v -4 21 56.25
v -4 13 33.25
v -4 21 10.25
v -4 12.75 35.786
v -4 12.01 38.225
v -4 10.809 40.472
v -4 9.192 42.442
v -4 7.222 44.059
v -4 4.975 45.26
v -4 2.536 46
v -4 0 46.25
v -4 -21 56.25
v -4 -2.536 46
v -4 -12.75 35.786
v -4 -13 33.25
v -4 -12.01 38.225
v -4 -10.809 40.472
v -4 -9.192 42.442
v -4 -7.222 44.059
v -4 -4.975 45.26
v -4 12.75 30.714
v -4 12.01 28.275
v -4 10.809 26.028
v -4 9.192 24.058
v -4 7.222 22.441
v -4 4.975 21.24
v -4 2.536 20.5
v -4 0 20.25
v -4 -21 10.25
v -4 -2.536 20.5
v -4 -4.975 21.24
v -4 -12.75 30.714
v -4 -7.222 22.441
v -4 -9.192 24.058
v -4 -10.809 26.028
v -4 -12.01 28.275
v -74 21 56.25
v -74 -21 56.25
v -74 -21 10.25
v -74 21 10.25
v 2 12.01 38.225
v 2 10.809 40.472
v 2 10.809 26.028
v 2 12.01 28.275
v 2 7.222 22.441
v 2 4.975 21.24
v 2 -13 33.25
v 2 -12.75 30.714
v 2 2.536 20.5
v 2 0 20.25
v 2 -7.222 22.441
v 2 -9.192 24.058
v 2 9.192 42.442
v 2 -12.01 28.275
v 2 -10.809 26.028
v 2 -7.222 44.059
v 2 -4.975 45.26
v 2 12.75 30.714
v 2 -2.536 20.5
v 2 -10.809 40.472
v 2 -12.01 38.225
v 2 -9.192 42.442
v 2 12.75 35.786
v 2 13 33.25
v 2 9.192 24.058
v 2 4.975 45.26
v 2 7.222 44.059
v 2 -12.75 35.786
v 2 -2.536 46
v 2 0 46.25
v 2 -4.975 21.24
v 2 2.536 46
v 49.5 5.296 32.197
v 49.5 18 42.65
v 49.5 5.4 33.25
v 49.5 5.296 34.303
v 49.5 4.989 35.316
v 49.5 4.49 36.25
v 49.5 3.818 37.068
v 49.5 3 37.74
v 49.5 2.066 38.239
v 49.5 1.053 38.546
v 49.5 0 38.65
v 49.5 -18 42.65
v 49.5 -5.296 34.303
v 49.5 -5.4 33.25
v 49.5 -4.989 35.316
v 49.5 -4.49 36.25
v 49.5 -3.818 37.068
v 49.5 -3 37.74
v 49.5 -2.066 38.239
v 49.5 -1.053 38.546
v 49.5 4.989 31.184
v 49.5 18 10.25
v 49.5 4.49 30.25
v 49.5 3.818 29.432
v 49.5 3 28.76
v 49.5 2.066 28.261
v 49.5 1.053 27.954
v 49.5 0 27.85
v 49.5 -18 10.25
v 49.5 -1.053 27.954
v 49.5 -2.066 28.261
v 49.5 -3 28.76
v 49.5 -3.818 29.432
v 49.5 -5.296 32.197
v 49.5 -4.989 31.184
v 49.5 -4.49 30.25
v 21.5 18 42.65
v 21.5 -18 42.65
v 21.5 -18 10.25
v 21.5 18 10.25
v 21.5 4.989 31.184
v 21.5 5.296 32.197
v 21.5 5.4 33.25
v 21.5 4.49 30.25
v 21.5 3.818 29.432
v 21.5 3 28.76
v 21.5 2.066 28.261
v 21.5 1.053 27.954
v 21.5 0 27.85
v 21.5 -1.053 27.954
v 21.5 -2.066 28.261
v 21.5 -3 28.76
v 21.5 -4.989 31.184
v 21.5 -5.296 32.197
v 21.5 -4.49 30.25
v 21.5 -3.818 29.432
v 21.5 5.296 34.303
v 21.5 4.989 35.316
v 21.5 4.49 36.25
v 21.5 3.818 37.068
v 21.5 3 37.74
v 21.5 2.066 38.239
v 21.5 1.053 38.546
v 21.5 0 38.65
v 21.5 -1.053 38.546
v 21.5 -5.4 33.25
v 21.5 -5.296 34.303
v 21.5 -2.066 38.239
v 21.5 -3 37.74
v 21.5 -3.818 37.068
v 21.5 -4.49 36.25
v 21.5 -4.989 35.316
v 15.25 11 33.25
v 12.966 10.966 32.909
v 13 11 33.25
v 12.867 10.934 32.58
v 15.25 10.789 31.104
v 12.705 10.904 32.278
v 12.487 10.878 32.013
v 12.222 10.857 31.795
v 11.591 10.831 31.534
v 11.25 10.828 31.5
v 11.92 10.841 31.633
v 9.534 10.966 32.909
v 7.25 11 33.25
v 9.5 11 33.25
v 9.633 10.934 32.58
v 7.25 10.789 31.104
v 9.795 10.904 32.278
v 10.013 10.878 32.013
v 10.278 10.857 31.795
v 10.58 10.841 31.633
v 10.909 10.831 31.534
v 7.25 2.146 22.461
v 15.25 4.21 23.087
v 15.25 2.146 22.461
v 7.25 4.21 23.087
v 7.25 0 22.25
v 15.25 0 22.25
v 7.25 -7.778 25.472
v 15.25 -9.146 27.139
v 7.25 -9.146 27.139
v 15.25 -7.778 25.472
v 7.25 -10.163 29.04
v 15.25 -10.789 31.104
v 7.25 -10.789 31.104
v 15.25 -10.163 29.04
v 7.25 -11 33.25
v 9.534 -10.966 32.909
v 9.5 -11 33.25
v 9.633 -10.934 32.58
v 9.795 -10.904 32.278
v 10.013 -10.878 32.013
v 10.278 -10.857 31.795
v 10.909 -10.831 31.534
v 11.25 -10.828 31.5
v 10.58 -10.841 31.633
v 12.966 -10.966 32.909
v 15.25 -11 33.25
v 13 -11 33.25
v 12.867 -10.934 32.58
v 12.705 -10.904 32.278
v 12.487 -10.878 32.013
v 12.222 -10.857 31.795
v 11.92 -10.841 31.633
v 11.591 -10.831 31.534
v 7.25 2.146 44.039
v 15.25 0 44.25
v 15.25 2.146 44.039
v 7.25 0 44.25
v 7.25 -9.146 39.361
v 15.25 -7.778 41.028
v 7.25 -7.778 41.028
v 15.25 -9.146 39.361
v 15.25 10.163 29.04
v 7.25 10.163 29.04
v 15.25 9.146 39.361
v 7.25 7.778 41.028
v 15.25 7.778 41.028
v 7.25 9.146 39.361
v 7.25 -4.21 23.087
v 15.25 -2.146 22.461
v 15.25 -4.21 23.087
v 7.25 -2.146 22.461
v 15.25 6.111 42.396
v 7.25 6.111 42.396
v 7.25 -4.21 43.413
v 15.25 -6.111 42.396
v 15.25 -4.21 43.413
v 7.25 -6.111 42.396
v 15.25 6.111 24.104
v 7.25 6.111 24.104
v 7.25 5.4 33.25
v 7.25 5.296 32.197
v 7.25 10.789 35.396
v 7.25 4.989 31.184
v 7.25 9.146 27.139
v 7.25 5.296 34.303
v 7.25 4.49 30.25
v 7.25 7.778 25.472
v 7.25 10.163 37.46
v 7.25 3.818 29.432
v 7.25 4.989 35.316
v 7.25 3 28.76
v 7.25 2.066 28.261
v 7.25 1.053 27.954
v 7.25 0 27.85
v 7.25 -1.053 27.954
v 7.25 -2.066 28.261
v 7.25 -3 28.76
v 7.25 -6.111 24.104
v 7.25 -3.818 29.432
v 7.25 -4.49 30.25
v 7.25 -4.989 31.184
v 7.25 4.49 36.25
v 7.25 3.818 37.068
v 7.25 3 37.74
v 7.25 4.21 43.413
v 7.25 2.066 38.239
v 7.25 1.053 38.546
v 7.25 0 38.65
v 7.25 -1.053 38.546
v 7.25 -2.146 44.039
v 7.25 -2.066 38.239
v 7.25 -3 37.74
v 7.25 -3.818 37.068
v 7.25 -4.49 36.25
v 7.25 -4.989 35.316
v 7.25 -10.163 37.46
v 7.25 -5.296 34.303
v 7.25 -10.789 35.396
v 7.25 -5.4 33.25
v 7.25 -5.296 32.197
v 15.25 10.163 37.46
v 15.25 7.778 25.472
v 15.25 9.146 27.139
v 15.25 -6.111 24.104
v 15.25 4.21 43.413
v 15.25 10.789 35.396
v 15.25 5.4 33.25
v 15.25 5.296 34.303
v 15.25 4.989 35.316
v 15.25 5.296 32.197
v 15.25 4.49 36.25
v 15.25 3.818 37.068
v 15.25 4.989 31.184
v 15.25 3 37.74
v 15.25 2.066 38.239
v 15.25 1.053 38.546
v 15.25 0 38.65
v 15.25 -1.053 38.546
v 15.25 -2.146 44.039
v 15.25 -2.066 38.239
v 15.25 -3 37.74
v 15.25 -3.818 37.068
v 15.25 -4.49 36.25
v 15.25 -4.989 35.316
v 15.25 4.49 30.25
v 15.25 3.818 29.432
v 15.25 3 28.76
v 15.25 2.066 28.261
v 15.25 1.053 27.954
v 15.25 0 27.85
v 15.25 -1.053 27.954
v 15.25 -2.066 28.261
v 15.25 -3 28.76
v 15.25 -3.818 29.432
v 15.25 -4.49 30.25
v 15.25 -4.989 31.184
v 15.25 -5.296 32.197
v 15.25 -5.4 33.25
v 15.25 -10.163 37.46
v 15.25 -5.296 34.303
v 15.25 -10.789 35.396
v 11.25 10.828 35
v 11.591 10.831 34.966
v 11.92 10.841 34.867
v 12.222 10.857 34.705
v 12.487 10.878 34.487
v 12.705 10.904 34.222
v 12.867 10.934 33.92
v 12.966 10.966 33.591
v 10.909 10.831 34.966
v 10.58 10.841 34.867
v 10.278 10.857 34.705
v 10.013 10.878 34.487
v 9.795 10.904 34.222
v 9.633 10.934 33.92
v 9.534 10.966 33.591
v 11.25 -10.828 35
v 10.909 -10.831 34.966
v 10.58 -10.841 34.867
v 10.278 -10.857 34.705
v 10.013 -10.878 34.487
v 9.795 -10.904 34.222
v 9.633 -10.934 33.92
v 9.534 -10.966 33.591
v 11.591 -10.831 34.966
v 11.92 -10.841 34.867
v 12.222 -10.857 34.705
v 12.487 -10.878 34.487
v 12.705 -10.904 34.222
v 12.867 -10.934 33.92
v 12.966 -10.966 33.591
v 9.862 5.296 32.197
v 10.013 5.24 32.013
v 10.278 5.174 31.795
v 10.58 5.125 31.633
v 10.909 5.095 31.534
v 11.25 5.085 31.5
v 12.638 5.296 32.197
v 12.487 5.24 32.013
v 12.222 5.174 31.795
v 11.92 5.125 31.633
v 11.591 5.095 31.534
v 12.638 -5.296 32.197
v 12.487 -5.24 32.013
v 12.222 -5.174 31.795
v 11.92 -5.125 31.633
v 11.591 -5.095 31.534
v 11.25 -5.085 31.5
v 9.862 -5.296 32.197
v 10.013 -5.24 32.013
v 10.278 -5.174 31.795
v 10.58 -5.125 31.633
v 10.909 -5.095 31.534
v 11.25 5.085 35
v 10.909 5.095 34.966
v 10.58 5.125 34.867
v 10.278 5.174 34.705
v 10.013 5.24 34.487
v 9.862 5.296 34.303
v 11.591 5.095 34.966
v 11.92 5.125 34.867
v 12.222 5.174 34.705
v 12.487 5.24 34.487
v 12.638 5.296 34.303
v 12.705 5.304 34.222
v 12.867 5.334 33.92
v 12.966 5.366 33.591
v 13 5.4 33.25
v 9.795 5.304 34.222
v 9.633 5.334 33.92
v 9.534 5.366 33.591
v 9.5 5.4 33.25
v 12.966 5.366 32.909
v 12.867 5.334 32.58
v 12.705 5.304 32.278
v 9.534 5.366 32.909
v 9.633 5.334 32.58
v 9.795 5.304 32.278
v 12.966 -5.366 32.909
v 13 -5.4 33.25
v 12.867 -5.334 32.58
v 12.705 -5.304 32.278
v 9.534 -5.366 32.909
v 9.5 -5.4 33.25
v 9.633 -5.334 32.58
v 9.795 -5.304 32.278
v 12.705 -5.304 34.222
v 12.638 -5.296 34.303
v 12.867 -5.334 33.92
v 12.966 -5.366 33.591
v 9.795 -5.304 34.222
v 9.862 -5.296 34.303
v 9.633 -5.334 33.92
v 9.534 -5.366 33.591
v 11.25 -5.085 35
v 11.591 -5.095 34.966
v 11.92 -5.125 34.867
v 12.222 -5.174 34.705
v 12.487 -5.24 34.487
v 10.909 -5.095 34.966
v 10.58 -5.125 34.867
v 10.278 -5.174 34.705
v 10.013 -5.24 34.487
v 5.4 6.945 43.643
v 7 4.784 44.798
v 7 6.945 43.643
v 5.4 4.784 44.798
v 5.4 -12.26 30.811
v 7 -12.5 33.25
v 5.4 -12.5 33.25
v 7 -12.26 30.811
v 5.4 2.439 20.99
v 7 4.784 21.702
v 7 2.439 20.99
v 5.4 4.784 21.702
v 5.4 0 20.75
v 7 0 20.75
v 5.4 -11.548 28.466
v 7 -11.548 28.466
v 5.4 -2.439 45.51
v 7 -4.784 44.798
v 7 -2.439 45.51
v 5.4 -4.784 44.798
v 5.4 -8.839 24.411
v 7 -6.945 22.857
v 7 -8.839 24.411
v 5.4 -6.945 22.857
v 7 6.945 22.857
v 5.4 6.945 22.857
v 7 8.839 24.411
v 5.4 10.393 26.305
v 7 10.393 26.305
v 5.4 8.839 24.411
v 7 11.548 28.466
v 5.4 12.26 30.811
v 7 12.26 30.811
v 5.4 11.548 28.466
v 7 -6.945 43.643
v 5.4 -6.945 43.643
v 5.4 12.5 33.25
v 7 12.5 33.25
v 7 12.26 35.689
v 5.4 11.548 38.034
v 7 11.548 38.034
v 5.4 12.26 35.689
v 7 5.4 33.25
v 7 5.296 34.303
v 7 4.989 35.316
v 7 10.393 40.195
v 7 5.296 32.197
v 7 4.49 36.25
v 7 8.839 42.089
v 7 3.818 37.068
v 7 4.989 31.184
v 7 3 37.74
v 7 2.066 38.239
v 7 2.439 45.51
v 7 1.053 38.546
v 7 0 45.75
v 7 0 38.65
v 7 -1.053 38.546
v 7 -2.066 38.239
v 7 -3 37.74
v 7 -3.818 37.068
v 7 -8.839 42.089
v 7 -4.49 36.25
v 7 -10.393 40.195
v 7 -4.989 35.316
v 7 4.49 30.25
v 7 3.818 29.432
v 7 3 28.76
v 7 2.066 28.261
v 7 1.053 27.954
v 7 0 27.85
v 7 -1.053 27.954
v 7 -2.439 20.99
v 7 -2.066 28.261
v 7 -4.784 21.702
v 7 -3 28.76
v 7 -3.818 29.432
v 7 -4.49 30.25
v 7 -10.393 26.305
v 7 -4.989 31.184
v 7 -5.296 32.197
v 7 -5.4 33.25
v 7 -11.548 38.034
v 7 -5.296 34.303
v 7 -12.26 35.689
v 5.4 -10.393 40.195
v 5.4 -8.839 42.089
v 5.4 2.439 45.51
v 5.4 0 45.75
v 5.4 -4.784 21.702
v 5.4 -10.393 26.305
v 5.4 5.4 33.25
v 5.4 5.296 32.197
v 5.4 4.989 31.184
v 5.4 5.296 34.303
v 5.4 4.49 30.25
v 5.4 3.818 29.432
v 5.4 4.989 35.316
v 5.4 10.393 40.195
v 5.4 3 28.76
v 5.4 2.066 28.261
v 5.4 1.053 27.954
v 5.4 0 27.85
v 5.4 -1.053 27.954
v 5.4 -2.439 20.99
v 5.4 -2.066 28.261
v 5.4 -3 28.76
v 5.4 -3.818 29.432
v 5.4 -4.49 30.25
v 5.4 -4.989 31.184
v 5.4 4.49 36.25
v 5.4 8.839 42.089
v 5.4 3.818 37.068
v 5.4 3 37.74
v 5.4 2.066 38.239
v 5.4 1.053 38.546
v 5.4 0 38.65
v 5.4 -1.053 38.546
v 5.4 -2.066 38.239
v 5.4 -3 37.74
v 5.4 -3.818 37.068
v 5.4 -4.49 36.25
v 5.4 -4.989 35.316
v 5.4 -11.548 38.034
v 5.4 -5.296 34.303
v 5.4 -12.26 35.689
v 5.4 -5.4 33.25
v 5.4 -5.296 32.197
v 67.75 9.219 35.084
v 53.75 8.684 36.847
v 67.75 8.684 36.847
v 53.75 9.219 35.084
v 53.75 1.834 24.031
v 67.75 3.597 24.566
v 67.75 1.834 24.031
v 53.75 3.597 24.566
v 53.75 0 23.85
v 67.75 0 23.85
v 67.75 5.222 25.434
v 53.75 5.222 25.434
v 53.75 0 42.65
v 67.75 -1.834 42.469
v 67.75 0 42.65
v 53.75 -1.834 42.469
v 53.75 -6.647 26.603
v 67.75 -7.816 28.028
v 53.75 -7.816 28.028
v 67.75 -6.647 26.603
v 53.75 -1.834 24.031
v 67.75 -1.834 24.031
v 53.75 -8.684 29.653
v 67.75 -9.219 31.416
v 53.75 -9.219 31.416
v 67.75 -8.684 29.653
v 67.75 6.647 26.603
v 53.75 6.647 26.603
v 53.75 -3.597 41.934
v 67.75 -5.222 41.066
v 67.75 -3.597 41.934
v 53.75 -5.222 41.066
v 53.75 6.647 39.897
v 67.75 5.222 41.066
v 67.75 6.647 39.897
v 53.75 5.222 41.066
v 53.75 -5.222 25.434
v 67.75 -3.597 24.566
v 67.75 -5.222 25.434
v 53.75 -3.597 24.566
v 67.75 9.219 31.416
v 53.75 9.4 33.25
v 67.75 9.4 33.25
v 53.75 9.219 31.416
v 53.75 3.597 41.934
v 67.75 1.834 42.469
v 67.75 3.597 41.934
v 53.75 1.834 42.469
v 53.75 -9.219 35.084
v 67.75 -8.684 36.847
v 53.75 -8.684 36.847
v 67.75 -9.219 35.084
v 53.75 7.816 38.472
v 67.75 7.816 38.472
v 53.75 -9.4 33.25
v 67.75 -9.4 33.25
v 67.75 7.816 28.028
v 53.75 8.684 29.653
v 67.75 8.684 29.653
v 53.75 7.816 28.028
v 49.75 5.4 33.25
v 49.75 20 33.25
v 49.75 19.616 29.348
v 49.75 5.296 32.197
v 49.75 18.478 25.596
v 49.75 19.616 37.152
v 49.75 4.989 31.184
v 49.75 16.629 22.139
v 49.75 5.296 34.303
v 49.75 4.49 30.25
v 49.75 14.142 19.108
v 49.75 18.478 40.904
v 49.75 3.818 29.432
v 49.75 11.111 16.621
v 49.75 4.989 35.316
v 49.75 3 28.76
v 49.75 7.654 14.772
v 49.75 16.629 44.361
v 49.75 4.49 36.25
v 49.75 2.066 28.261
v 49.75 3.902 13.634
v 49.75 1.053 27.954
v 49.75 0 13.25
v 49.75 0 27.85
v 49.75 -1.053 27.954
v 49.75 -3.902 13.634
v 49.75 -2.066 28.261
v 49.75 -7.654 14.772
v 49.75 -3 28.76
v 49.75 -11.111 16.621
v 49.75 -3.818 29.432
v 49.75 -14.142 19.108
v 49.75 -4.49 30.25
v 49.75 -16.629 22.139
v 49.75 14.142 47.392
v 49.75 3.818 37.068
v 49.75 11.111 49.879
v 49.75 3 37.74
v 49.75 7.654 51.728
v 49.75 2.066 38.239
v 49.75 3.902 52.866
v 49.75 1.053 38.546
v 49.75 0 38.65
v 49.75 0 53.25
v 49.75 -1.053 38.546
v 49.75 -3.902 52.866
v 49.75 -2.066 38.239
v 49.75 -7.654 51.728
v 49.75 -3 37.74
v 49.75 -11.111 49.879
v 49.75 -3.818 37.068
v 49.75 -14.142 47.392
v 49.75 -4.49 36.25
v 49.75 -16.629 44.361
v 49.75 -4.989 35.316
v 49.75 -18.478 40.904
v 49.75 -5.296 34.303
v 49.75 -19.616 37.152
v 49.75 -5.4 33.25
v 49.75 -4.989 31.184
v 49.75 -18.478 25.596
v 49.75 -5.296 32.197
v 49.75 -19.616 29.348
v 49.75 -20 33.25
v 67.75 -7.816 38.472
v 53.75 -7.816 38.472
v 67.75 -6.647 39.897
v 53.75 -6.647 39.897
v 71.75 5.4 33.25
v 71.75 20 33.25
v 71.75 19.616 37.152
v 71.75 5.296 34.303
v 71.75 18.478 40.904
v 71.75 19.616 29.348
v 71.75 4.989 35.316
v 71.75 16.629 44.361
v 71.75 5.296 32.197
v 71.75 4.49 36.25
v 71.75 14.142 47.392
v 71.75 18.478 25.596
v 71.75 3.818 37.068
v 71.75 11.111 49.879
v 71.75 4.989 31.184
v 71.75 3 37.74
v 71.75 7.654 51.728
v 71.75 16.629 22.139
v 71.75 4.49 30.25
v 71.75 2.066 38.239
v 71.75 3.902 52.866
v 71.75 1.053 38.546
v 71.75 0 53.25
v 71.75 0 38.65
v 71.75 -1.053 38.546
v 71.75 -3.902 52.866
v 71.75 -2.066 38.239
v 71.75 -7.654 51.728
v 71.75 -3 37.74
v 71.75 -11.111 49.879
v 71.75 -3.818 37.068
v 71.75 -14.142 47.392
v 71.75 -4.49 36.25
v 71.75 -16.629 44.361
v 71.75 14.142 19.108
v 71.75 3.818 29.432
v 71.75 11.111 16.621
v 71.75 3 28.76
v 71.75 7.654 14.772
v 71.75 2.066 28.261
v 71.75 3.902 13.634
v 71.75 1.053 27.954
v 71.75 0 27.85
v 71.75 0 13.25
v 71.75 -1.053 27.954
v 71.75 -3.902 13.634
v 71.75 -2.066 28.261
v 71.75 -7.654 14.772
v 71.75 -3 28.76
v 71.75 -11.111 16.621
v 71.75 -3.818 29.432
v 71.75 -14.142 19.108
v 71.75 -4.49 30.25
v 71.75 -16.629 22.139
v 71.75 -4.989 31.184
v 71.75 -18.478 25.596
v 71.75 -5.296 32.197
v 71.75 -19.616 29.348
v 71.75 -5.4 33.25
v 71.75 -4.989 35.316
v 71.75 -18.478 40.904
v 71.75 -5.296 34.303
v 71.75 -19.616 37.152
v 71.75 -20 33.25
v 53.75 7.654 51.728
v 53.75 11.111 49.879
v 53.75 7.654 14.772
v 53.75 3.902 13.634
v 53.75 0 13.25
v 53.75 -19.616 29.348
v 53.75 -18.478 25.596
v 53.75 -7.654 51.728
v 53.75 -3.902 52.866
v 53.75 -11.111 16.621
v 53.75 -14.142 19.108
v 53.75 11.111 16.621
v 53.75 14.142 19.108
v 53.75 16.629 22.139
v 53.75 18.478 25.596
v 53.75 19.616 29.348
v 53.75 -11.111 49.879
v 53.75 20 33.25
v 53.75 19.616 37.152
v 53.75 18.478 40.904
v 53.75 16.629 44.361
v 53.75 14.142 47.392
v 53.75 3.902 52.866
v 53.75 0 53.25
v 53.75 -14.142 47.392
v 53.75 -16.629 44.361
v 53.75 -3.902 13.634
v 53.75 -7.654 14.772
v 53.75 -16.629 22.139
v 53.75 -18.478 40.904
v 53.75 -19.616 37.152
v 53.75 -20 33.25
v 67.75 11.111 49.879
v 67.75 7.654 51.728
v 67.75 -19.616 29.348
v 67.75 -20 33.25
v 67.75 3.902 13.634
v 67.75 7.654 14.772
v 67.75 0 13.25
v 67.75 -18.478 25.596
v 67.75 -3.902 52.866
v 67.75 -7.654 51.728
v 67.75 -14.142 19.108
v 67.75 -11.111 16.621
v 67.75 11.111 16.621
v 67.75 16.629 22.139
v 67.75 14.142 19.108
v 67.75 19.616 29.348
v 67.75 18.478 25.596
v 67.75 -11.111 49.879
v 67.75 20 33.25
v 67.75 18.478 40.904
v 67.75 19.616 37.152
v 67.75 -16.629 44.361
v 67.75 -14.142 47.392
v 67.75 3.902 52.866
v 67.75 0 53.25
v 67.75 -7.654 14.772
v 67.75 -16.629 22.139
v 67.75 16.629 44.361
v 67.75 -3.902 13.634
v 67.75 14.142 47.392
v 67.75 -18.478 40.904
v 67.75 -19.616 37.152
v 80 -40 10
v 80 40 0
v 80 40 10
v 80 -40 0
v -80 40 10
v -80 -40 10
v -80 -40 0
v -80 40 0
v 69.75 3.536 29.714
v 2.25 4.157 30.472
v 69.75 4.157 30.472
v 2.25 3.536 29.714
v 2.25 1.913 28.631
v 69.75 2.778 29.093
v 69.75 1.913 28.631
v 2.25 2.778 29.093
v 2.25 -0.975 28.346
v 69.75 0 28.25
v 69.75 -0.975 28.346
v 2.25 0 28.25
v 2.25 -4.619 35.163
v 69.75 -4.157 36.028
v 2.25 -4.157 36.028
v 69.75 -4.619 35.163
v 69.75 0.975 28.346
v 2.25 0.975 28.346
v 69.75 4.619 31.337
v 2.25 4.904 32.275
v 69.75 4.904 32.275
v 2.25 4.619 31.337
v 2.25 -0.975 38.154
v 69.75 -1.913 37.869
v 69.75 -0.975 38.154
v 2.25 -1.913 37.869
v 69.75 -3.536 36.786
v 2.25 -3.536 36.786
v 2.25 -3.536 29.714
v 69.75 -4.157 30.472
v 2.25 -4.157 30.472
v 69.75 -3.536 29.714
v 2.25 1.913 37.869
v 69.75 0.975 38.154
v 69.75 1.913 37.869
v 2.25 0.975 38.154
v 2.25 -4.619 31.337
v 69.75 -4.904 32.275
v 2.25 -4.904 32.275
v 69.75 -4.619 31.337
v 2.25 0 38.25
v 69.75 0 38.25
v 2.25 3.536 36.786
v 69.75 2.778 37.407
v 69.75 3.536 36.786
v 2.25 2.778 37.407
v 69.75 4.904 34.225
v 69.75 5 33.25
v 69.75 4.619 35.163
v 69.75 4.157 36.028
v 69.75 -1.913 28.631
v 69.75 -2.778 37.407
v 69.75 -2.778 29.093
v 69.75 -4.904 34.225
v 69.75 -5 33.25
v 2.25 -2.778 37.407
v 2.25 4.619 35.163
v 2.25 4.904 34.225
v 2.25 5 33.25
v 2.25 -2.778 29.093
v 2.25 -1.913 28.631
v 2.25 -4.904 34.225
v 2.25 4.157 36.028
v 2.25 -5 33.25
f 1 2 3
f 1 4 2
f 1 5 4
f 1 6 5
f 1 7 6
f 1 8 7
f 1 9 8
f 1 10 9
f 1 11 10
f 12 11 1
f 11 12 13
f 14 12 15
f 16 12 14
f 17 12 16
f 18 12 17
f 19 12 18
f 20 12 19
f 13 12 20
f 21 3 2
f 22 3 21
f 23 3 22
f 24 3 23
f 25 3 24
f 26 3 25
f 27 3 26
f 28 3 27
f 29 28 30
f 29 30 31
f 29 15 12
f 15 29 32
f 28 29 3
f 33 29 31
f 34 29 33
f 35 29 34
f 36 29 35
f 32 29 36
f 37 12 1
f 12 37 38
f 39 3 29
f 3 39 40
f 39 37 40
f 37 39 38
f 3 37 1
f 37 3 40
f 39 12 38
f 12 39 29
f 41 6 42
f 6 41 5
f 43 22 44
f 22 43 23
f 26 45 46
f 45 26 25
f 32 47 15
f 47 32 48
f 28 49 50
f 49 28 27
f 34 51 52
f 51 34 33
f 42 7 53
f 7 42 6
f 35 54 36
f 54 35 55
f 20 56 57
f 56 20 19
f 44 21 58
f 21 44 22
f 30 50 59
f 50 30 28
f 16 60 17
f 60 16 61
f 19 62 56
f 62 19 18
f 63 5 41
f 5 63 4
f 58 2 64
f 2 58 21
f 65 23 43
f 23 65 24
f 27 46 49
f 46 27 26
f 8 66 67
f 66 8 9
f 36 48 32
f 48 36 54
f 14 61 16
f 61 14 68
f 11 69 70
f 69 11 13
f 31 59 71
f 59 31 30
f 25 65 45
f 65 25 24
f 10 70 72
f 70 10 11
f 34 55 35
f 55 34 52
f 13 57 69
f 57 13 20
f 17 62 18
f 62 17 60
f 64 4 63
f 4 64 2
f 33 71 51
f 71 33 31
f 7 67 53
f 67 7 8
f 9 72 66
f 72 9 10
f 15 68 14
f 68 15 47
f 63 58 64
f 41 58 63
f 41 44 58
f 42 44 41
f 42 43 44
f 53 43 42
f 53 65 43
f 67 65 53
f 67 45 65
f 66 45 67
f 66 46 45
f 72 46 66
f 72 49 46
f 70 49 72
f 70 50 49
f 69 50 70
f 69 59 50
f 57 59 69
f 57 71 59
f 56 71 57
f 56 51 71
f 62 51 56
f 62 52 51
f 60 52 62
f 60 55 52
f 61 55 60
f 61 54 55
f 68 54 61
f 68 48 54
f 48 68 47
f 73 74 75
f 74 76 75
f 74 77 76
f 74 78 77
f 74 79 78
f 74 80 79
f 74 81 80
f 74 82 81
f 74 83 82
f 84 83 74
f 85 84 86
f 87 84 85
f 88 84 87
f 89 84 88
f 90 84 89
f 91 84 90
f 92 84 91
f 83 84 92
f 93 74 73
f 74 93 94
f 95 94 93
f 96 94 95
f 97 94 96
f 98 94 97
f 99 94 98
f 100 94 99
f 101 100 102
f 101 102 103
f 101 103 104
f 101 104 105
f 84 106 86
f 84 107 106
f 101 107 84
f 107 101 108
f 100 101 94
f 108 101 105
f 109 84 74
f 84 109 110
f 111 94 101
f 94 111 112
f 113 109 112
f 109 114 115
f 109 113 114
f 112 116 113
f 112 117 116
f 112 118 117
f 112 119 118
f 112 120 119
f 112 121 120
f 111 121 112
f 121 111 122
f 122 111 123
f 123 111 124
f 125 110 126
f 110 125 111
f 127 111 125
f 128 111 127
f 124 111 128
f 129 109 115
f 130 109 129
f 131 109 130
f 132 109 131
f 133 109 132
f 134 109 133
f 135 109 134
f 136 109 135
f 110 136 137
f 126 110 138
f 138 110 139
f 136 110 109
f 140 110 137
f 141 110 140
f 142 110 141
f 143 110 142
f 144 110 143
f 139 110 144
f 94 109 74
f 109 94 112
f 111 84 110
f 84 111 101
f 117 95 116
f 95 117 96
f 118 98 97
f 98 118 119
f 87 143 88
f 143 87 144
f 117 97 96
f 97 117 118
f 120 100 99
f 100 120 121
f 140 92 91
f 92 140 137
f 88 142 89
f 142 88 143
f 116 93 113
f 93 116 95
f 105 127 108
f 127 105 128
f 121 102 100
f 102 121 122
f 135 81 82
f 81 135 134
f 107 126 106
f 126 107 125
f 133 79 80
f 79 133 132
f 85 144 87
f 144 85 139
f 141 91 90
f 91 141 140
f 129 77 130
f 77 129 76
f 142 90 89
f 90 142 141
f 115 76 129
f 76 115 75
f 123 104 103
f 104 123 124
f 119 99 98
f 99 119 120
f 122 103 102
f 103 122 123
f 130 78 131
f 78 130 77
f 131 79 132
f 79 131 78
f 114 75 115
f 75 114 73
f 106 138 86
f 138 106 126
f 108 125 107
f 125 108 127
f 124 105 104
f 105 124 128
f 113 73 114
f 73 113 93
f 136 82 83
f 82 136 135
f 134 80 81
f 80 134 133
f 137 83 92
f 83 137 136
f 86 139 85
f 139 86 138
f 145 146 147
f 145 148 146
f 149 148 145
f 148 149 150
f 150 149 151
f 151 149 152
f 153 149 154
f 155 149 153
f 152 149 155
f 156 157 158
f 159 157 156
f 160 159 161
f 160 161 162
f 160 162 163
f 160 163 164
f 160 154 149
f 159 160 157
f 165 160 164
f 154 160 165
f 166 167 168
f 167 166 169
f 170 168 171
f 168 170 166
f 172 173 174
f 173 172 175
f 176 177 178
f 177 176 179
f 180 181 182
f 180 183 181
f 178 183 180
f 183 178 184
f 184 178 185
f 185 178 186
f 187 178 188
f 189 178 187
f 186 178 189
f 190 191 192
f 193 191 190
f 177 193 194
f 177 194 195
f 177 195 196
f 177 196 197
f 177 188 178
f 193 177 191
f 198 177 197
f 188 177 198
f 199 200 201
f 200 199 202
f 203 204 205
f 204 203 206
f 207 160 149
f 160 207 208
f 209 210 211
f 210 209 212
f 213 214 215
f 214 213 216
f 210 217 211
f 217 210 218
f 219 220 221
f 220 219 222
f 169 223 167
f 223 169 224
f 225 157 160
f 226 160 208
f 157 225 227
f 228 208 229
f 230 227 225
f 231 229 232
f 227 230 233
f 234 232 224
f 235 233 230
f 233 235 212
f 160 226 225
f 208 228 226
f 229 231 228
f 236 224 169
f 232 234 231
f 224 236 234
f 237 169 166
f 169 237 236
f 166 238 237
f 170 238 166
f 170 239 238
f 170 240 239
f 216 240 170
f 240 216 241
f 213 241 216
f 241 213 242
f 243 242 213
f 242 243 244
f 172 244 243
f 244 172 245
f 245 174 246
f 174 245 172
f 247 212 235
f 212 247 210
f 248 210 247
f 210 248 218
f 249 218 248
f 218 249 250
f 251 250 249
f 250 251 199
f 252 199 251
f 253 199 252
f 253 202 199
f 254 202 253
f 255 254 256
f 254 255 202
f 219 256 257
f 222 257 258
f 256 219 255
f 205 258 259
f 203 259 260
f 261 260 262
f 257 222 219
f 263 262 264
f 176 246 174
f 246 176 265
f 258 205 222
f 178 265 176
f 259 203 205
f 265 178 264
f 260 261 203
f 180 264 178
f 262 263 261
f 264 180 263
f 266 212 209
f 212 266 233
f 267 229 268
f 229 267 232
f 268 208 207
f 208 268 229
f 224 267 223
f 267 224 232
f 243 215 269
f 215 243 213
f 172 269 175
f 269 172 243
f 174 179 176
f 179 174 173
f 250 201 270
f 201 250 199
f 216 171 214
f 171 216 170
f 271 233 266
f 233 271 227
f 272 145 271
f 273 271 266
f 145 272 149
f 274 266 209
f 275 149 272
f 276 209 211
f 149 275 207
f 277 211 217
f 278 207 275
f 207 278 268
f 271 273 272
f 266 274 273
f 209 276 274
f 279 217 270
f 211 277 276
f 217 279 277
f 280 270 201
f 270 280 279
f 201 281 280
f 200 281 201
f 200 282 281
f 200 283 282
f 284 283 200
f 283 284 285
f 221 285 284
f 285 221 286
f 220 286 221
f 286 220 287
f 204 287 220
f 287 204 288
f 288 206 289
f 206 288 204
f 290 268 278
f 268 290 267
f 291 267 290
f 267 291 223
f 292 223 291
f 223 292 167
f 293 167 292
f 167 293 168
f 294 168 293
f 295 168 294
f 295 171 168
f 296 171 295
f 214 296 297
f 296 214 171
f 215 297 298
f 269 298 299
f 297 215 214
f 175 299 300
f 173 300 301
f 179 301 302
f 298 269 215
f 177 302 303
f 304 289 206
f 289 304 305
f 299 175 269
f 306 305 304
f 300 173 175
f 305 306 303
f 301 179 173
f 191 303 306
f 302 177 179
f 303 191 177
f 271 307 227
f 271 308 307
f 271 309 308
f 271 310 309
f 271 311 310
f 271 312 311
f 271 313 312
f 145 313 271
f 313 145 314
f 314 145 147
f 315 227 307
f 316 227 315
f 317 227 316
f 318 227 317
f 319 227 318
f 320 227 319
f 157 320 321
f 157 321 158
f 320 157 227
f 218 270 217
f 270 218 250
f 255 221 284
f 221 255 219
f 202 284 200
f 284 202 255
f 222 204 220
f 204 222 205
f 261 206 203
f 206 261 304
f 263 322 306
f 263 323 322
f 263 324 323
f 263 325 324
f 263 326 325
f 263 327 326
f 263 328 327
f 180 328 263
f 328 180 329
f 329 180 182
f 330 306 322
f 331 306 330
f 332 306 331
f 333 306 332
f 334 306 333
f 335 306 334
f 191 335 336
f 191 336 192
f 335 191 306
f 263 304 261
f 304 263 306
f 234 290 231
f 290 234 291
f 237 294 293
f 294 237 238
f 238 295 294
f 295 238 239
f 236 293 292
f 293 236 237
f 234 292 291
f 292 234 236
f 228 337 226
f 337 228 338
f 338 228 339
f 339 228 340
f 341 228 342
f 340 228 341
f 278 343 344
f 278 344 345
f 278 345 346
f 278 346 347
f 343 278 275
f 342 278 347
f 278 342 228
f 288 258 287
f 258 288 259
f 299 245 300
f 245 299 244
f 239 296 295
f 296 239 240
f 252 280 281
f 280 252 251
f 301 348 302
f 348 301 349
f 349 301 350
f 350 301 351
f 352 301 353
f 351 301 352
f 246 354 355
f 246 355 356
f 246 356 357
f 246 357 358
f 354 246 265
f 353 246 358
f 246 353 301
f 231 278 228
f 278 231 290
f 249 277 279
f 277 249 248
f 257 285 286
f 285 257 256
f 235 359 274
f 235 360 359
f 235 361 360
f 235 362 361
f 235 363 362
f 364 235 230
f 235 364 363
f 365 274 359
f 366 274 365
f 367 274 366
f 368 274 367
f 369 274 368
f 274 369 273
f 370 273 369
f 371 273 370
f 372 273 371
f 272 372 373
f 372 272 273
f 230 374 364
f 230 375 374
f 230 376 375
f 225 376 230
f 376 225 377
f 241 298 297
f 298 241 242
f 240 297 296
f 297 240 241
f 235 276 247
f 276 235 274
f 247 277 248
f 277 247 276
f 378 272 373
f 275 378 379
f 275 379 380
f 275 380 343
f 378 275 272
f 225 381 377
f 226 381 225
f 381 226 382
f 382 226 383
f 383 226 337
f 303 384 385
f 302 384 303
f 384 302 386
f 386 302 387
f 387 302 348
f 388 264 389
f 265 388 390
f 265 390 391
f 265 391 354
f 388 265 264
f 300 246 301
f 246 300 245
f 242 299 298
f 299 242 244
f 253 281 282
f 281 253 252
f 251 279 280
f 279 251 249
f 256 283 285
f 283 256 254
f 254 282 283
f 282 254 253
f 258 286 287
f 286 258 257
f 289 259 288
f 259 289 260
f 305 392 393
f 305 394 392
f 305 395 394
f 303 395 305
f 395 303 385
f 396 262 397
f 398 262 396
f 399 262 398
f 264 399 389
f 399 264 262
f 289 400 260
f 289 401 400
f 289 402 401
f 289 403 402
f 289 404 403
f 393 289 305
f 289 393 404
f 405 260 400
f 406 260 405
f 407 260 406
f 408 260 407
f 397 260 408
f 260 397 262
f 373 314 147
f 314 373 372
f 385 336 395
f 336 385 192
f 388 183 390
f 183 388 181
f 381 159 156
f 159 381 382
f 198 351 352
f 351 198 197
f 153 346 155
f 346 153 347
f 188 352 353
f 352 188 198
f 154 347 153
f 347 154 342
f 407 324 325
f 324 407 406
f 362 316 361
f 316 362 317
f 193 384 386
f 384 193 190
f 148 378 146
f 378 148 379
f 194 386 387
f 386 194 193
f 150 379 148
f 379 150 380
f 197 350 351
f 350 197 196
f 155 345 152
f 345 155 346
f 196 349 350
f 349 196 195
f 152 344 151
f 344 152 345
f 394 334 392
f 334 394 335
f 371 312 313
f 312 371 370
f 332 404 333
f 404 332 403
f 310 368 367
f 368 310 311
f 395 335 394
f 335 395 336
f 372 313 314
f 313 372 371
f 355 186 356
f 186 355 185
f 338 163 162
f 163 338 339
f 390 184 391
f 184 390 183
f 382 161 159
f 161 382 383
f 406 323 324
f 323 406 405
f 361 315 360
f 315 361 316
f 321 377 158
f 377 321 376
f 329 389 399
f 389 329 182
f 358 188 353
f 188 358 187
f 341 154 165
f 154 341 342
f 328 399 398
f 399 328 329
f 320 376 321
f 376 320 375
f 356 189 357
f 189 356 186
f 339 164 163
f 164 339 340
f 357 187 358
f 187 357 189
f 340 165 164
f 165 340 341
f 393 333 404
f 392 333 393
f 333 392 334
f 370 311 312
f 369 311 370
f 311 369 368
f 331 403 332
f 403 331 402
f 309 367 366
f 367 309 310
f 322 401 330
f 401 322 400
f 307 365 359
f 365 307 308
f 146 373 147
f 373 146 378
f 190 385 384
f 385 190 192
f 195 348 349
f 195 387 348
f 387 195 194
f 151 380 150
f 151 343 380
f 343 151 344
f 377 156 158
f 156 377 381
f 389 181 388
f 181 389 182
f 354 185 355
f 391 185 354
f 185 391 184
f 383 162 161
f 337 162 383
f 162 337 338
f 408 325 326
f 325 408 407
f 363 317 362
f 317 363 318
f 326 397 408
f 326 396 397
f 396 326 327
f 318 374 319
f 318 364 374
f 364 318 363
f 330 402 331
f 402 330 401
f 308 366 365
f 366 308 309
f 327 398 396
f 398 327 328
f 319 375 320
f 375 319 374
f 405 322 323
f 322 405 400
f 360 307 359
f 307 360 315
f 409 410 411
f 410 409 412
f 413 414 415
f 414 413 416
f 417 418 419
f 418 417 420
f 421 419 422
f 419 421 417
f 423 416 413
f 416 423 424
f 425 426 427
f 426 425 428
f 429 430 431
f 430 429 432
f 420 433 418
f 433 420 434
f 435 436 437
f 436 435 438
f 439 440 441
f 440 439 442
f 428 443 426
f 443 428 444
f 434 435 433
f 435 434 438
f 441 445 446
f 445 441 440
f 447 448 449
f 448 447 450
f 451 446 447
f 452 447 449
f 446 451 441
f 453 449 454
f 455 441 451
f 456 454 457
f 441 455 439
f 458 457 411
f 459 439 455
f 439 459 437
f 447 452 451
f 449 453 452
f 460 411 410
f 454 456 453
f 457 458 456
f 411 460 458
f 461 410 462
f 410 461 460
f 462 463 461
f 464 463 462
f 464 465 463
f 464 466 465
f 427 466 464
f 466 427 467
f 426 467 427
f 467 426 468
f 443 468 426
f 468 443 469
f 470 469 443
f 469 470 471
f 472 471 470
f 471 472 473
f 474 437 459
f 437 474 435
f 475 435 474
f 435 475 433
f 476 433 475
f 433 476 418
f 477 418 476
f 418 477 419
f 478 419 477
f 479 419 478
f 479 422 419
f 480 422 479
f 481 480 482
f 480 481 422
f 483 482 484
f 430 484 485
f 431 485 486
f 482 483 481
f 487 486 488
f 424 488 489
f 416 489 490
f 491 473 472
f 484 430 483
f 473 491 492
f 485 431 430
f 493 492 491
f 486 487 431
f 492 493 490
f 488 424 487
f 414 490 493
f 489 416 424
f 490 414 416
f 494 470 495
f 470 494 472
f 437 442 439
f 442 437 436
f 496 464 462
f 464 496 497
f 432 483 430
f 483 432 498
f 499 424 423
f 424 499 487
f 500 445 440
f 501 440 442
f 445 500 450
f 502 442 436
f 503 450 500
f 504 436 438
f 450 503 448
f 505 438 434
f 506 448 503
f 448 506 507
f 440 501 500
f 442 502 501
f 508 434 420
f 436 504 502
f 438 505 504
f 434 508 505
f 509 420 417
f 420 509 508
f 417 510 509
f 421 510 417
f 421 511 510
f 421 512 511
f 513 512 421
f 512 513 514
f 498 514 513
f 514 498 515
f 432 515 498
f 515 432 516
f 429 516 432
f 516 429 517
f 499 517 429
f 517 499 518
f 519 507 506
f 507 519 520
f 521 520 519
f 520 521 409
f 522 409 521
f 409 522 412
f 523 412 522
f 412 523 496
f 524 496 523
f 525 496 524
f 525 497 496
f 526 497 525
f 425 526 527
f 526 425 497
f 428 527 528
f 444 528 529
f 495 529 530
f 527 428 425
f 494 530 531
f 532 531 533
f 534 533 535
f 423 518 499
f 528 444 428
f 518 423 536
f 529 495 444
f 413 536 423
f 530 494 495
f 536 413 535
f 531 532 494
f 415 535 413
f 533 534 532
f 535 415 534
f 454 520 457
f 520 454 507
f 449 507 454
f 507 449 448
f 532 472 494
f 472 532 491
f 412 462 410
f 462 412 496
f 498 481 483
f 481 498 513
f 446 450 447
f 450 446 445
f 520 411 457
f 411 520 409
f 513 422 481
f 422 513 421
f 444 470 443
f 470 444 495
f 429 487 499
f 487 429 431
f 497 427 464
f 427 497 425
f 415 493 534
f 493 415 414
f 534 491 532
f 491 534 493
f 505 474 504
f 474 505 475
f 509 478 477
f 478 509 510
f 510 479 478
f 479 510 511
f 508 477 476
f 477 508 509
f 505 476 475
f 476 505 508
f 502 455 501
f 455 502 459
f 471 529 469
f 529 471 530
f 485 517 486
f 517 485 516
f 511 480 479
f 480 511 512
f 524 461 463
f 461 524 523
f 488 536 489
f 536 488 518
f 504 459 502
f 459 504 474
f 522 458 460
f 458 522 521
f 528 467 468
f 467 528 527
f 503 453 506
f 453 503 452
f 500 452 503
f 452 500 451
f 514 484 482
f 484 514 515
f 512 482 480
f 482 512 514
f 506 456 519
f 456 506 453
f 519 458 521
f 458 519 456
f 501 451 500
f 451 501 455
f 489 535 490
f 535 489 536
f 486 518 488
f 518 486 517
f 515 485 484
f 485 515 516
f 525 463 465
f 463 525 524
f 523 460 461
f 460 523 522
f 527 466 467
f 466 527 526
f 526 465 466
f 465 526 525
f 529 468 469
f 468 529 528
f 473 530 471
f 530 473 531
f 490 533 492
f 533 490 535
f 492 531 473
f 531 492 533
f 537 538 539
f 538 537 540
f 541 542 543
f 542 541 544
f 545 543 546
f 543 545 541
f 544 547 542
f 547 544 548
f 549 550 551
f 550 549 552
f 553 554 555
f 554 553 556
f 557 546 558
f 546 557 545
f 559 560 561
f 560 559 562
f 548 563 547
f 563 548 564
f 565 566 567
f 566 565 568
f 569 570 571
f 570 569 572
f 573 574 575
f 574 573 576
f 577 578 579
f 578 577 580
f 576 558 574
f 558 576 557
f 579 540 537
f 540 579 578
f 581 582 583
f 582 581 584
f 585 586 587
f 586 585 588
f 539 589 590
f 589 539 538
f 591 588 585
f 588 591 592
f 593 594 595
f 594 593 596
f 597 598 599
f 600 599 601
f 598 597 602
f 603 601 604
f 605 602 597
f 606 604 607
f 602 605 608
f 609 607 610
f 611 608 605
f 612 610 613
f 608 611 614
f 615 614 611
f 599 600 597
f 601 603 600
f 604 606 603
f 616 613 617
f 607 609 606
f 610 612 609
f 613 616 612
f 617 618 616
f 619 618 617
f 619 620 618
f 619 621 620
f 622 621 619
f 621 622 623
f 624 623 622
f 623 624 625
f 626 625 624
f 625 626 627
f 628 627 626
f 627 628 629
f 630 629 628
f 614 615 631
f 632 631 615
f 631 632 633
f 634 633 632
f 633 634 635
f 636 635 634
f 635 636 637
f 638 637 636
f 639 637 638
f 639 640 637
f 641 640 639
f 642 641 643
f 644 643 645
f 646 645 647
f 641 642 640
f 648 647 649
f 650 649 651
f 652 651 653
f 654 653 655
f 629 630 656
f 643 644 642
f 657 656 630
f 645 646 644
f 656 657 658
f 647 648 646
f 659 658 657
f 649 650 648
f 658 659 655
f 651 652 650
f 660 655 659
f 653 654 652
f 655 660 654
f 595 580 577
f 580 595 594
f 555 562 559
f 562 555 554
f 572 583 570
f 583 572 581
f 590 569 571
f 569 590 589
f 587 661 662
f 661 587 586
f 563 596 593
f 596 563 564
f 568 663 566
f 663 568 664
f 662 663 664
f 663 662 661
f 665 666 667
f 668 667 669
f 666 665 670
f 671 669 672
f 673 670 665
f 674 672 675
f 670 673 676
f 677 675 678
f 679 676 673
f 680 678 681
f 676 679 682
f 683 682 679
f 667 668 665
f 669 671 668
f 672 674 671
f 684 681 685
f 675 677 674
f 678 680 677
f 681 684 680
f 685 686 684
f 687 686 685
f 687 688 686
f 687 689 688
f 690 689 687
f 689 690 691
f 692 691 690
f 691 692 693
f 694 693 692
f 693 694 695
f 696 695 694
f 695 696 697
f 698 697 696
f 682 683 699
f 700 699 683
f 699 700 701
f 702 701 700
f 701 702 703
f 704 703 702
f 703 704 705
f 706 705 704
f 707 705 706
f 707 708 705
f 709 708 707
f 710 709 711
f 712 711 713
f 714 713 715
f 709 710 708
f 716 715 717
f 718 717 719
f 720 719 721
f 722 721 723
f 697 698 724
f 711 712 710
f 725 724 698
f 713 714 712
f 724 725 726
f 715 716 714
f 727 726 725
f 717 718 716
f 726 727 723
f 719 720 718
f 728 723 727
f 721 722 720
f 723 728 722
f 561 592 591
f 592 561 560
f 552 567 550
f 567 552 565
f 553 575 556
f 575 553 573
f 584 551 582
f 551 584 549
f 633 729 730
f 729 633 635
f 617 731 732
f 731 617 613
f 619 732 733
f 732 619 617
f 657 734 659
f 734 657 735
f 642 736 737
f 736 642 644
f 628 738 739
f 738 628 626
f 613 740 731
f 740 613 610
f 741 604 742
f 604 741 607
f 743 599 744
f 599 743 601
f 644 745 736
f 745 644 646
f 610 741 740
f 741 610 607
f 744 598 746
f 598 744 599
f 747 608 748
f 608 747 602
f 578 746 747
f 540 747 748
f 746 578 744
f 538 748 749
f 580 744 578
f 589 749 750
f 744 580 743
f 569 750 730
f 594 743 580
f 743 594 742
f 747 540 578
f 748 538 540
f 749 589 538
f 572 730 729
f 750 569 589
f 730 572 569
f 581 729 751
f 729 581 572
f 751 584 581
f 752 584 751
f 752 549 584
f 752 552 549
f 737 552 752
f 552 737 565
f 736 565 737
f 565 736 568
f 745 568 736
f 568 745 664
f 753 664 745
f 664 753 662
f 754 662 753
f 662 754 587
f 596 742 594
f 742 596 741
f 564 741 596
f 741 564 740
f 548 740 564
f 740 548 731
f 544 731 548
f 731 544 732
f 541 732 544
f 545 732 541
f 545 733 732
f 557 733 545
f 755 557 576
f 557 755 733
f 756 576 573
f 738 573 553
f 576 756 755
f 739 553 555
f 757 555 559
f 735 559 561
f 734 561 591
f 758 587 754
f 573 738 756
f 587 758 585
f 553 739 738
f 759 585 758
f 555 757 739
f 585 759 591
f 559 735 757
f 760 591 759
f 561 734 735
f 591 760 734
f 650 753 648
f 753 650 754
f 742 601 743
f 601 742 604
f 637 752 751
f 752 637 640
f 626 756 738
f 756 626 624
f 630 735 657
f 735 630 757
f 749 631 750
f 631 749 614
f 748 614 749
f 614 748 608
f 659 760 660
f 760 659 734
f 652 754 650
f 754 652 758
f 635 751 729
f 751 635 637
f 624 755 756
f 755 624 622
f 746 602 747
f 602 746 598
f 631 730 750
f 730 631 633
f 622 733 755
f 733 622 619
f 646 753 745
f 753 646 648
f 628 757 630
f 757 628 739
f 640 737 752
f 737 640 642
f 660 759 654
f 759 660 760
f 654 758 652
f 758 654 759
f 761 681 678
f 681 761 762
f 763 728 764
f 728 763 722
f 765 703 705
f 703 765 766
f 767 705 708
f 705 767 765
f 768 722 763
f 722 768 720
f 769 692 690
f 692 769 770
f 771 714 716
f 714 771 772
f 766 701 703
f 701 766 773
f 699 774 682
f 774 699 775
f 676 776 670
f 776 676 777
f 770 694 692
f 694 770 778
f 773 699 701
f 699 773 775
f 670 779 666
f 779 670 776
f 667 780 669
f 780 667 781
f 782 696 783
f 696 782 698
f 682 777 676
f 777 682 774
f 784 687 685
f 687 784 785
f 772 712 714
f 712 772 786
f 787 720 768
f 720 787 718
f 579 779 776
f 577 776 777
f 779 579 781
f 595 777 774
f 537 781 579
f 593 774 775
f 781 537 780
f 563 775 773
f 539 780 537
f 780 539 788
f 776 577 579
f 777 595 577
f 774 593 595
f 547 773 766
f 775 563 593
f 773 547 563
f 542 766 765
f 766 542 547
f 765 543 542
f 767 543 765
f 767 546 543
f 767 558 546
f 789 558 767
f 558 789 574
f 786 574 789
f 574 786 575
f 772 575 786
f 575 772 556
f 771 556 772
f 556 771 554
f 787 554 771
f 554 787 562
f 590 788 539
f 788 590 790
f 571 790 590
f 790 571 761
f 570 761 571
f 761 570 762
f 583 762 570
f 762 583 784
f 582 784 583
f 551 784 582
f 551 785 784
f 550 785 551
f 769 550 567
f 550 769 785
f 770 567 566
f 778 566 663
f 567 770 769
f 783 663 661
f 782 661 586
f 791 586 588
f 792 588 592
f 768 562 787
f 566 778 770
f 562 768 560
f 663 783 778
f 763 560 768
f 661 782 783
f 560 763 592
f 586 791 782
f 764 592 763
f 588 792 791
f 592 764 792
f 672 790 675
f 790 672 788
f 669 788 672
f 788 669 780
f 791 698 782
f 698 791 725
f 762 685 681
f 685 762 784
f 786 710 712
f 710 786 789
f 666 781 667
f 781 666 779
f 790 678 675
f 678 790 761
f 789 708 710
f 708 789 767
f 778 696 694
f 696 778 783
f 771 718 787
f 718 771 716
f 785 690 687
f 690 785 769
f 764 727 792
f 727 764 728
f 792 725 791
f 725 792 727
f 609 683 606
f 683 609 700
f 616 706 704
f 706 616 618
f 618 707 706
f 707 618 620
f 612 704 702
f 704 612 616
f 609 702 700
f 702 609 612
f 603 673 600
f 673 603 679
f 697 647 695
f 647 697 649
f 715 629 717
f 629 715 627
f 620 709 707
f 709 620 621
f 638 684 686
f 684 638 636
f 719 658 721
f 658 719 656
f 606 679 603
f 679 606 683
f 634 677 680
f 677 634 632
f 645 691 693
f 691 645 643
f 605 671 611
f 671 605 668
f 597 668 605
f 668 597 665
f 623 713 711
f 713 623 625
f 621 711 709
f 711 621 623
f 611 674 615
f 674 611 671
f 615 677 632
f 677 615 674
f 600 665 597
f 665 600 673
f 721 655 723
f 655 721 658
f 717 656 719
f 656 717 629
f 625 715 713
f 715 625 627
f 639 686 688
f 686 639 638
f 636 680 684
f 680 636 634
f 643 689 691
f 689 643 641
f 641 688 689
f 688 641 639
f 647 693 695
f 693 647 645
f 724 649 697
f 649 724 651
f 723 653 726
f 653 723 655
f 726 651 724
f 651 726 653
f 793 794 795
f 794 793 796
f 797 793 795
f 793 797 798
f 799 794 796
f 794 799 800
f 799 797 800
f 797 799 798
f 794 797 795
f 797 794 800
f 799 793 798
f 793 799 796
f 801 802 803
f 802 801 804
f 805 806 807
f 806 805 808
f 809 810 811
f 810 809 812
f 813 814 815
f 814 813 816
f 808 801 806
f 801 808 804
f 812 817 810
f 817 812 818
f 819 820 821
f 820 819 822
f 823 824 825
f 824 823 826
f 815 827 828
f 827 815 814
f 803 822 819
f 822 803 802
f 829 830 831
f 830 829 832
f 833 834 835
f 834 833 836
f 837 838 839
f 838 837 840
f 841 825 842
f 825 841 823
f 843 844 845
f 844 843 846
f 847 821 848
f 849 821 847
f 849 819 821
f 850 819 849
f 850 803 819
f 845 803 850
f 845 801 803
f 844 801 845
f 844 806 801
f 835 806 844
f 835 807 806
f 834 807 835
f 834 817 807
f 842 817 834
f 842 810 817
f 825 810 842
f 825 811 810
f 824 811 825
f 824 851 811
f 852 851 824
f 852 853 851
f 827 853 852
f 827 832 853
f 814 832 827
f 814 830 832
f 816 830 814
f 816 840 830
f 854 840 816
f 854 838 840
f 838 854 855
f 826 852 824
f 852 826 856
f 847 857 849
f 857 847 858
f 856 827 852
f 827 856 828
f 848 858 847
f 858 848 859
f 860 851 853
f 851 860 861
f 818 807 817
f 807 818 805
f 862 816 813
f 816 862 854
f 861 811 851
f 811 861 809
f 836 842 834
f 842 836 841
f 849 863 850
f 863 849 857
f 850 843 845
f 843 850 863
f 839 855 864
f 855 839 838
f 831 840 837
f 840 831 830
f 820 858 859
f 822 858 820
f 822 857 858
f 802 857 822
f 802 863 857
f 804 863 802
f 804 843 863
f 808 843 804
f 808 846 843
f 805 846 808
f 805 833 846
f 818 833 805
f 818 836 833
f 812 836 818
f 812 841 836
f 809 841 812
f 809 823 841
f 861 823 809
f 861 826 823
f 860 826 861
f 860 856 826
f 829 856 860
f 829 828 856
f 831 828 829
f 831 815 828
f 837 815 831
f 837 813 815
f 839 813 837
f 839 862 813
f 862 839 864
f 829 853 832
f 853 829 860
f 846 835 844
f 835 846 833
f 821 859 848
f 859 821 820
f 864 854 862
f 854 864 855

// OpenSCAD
$fn = 32;

// ------------------------------------------------------------------------
// Motor drive station: motor 70 x 46 mm, shaft d10, pulley d40
// Every part is its own module, assembly() places every instance.
// ------------------------------------------------------------------------

// --- part 1 ---
module station_bed() {
  difference() {
    translate([-80, -40, 0]) cube([160, 80, 10]);
  }
}

// --- part 2 ---
module drive_motor() {
  union() {
    translate([-35, -21, 0]) cube([70, 42, 46]);
    translate([38, 0, 23]) rotate([0, 90, 0]) cylinder(h = 6, d = 26, center = true);
  }
}

// --- part 3 ---
module pillow_block() {
  difference() {
    translate([-14, -18, 0]) cube([28, 36, 32.4]);
    translate([0, 0, 23]) rotate([0, 90, 0]) cylinder(h = 30, d = 10.8, center = true);
  }
}

// --- part 4 ---
module drive_shaft() {
  translate([0, 0, -33.75]) cylinder(h = 67.5, d = 10);
}

// --- part 5 ---
module shaft_collar() {
  difference() {
    cylinder(h = 8, d = 22);
    translate([0, 0, -1]) cylinder(h = 10, d = 10.8);
    translate([0, 0, 4]) rotate([90, 0, 0]) cylinder(h = 24, d = 3.5, center = true);
  }
}

// --- part 6 ---
module collar_washer() {
  difference() {
      translate([0, 0, 0]) cylinder(h = 1.6, d = 25);
      translate([0, 0, -1]) cylinder(h = 3.6, d = 10.8);
    }
}

// --- part 7 ---
module drive_pulley() {
  difference() {
    union() {
      cylinder(h = 22, d = 18.8);
      cylinder(h = 4, d = 40);
      translate([0, 0, 18]) cylinder(h = 4, d = 40);
    }
    translate([0, 0, -1]) cylinder(h = 24, d = 10.8);
  }
}

// --- assembly ---
module assembly() {
  color([0.80, 0.24, 0.20]) translate([0, 0, 0]) rotate([0, 0, 0]) station_bed();
  color([0.20, 0.45, 0.75]) translate([-39, 0, 10.25]) rotate([0, 0, 0]) drive_motor();
  color([0.25, 0.62, 0.32]) translate([35.5, 0, 10.25]) rotate([0, 0, 0]) pillow_block();
  color([0.92, 0.70, 0.18]) translate([36, 0, 33.25]) rotate([0, 90, 0]) drive_shaft();
  color([0.58, 0.35, 0.70]) translate([7.25, 0, 33.25]) rotate([0, 90, 0]) shaft_collar();
  color([0.16, 0.66, 0.66]) translate([5.4, 0, 33.25]) rotate([0, 90, 0]) collar_washer();
  color([0.85, 0.48, 0.18]) translate([49.75, 0, 33.25]) rotate([0, 90, 0]) drive_pulley();
}

assembly();
